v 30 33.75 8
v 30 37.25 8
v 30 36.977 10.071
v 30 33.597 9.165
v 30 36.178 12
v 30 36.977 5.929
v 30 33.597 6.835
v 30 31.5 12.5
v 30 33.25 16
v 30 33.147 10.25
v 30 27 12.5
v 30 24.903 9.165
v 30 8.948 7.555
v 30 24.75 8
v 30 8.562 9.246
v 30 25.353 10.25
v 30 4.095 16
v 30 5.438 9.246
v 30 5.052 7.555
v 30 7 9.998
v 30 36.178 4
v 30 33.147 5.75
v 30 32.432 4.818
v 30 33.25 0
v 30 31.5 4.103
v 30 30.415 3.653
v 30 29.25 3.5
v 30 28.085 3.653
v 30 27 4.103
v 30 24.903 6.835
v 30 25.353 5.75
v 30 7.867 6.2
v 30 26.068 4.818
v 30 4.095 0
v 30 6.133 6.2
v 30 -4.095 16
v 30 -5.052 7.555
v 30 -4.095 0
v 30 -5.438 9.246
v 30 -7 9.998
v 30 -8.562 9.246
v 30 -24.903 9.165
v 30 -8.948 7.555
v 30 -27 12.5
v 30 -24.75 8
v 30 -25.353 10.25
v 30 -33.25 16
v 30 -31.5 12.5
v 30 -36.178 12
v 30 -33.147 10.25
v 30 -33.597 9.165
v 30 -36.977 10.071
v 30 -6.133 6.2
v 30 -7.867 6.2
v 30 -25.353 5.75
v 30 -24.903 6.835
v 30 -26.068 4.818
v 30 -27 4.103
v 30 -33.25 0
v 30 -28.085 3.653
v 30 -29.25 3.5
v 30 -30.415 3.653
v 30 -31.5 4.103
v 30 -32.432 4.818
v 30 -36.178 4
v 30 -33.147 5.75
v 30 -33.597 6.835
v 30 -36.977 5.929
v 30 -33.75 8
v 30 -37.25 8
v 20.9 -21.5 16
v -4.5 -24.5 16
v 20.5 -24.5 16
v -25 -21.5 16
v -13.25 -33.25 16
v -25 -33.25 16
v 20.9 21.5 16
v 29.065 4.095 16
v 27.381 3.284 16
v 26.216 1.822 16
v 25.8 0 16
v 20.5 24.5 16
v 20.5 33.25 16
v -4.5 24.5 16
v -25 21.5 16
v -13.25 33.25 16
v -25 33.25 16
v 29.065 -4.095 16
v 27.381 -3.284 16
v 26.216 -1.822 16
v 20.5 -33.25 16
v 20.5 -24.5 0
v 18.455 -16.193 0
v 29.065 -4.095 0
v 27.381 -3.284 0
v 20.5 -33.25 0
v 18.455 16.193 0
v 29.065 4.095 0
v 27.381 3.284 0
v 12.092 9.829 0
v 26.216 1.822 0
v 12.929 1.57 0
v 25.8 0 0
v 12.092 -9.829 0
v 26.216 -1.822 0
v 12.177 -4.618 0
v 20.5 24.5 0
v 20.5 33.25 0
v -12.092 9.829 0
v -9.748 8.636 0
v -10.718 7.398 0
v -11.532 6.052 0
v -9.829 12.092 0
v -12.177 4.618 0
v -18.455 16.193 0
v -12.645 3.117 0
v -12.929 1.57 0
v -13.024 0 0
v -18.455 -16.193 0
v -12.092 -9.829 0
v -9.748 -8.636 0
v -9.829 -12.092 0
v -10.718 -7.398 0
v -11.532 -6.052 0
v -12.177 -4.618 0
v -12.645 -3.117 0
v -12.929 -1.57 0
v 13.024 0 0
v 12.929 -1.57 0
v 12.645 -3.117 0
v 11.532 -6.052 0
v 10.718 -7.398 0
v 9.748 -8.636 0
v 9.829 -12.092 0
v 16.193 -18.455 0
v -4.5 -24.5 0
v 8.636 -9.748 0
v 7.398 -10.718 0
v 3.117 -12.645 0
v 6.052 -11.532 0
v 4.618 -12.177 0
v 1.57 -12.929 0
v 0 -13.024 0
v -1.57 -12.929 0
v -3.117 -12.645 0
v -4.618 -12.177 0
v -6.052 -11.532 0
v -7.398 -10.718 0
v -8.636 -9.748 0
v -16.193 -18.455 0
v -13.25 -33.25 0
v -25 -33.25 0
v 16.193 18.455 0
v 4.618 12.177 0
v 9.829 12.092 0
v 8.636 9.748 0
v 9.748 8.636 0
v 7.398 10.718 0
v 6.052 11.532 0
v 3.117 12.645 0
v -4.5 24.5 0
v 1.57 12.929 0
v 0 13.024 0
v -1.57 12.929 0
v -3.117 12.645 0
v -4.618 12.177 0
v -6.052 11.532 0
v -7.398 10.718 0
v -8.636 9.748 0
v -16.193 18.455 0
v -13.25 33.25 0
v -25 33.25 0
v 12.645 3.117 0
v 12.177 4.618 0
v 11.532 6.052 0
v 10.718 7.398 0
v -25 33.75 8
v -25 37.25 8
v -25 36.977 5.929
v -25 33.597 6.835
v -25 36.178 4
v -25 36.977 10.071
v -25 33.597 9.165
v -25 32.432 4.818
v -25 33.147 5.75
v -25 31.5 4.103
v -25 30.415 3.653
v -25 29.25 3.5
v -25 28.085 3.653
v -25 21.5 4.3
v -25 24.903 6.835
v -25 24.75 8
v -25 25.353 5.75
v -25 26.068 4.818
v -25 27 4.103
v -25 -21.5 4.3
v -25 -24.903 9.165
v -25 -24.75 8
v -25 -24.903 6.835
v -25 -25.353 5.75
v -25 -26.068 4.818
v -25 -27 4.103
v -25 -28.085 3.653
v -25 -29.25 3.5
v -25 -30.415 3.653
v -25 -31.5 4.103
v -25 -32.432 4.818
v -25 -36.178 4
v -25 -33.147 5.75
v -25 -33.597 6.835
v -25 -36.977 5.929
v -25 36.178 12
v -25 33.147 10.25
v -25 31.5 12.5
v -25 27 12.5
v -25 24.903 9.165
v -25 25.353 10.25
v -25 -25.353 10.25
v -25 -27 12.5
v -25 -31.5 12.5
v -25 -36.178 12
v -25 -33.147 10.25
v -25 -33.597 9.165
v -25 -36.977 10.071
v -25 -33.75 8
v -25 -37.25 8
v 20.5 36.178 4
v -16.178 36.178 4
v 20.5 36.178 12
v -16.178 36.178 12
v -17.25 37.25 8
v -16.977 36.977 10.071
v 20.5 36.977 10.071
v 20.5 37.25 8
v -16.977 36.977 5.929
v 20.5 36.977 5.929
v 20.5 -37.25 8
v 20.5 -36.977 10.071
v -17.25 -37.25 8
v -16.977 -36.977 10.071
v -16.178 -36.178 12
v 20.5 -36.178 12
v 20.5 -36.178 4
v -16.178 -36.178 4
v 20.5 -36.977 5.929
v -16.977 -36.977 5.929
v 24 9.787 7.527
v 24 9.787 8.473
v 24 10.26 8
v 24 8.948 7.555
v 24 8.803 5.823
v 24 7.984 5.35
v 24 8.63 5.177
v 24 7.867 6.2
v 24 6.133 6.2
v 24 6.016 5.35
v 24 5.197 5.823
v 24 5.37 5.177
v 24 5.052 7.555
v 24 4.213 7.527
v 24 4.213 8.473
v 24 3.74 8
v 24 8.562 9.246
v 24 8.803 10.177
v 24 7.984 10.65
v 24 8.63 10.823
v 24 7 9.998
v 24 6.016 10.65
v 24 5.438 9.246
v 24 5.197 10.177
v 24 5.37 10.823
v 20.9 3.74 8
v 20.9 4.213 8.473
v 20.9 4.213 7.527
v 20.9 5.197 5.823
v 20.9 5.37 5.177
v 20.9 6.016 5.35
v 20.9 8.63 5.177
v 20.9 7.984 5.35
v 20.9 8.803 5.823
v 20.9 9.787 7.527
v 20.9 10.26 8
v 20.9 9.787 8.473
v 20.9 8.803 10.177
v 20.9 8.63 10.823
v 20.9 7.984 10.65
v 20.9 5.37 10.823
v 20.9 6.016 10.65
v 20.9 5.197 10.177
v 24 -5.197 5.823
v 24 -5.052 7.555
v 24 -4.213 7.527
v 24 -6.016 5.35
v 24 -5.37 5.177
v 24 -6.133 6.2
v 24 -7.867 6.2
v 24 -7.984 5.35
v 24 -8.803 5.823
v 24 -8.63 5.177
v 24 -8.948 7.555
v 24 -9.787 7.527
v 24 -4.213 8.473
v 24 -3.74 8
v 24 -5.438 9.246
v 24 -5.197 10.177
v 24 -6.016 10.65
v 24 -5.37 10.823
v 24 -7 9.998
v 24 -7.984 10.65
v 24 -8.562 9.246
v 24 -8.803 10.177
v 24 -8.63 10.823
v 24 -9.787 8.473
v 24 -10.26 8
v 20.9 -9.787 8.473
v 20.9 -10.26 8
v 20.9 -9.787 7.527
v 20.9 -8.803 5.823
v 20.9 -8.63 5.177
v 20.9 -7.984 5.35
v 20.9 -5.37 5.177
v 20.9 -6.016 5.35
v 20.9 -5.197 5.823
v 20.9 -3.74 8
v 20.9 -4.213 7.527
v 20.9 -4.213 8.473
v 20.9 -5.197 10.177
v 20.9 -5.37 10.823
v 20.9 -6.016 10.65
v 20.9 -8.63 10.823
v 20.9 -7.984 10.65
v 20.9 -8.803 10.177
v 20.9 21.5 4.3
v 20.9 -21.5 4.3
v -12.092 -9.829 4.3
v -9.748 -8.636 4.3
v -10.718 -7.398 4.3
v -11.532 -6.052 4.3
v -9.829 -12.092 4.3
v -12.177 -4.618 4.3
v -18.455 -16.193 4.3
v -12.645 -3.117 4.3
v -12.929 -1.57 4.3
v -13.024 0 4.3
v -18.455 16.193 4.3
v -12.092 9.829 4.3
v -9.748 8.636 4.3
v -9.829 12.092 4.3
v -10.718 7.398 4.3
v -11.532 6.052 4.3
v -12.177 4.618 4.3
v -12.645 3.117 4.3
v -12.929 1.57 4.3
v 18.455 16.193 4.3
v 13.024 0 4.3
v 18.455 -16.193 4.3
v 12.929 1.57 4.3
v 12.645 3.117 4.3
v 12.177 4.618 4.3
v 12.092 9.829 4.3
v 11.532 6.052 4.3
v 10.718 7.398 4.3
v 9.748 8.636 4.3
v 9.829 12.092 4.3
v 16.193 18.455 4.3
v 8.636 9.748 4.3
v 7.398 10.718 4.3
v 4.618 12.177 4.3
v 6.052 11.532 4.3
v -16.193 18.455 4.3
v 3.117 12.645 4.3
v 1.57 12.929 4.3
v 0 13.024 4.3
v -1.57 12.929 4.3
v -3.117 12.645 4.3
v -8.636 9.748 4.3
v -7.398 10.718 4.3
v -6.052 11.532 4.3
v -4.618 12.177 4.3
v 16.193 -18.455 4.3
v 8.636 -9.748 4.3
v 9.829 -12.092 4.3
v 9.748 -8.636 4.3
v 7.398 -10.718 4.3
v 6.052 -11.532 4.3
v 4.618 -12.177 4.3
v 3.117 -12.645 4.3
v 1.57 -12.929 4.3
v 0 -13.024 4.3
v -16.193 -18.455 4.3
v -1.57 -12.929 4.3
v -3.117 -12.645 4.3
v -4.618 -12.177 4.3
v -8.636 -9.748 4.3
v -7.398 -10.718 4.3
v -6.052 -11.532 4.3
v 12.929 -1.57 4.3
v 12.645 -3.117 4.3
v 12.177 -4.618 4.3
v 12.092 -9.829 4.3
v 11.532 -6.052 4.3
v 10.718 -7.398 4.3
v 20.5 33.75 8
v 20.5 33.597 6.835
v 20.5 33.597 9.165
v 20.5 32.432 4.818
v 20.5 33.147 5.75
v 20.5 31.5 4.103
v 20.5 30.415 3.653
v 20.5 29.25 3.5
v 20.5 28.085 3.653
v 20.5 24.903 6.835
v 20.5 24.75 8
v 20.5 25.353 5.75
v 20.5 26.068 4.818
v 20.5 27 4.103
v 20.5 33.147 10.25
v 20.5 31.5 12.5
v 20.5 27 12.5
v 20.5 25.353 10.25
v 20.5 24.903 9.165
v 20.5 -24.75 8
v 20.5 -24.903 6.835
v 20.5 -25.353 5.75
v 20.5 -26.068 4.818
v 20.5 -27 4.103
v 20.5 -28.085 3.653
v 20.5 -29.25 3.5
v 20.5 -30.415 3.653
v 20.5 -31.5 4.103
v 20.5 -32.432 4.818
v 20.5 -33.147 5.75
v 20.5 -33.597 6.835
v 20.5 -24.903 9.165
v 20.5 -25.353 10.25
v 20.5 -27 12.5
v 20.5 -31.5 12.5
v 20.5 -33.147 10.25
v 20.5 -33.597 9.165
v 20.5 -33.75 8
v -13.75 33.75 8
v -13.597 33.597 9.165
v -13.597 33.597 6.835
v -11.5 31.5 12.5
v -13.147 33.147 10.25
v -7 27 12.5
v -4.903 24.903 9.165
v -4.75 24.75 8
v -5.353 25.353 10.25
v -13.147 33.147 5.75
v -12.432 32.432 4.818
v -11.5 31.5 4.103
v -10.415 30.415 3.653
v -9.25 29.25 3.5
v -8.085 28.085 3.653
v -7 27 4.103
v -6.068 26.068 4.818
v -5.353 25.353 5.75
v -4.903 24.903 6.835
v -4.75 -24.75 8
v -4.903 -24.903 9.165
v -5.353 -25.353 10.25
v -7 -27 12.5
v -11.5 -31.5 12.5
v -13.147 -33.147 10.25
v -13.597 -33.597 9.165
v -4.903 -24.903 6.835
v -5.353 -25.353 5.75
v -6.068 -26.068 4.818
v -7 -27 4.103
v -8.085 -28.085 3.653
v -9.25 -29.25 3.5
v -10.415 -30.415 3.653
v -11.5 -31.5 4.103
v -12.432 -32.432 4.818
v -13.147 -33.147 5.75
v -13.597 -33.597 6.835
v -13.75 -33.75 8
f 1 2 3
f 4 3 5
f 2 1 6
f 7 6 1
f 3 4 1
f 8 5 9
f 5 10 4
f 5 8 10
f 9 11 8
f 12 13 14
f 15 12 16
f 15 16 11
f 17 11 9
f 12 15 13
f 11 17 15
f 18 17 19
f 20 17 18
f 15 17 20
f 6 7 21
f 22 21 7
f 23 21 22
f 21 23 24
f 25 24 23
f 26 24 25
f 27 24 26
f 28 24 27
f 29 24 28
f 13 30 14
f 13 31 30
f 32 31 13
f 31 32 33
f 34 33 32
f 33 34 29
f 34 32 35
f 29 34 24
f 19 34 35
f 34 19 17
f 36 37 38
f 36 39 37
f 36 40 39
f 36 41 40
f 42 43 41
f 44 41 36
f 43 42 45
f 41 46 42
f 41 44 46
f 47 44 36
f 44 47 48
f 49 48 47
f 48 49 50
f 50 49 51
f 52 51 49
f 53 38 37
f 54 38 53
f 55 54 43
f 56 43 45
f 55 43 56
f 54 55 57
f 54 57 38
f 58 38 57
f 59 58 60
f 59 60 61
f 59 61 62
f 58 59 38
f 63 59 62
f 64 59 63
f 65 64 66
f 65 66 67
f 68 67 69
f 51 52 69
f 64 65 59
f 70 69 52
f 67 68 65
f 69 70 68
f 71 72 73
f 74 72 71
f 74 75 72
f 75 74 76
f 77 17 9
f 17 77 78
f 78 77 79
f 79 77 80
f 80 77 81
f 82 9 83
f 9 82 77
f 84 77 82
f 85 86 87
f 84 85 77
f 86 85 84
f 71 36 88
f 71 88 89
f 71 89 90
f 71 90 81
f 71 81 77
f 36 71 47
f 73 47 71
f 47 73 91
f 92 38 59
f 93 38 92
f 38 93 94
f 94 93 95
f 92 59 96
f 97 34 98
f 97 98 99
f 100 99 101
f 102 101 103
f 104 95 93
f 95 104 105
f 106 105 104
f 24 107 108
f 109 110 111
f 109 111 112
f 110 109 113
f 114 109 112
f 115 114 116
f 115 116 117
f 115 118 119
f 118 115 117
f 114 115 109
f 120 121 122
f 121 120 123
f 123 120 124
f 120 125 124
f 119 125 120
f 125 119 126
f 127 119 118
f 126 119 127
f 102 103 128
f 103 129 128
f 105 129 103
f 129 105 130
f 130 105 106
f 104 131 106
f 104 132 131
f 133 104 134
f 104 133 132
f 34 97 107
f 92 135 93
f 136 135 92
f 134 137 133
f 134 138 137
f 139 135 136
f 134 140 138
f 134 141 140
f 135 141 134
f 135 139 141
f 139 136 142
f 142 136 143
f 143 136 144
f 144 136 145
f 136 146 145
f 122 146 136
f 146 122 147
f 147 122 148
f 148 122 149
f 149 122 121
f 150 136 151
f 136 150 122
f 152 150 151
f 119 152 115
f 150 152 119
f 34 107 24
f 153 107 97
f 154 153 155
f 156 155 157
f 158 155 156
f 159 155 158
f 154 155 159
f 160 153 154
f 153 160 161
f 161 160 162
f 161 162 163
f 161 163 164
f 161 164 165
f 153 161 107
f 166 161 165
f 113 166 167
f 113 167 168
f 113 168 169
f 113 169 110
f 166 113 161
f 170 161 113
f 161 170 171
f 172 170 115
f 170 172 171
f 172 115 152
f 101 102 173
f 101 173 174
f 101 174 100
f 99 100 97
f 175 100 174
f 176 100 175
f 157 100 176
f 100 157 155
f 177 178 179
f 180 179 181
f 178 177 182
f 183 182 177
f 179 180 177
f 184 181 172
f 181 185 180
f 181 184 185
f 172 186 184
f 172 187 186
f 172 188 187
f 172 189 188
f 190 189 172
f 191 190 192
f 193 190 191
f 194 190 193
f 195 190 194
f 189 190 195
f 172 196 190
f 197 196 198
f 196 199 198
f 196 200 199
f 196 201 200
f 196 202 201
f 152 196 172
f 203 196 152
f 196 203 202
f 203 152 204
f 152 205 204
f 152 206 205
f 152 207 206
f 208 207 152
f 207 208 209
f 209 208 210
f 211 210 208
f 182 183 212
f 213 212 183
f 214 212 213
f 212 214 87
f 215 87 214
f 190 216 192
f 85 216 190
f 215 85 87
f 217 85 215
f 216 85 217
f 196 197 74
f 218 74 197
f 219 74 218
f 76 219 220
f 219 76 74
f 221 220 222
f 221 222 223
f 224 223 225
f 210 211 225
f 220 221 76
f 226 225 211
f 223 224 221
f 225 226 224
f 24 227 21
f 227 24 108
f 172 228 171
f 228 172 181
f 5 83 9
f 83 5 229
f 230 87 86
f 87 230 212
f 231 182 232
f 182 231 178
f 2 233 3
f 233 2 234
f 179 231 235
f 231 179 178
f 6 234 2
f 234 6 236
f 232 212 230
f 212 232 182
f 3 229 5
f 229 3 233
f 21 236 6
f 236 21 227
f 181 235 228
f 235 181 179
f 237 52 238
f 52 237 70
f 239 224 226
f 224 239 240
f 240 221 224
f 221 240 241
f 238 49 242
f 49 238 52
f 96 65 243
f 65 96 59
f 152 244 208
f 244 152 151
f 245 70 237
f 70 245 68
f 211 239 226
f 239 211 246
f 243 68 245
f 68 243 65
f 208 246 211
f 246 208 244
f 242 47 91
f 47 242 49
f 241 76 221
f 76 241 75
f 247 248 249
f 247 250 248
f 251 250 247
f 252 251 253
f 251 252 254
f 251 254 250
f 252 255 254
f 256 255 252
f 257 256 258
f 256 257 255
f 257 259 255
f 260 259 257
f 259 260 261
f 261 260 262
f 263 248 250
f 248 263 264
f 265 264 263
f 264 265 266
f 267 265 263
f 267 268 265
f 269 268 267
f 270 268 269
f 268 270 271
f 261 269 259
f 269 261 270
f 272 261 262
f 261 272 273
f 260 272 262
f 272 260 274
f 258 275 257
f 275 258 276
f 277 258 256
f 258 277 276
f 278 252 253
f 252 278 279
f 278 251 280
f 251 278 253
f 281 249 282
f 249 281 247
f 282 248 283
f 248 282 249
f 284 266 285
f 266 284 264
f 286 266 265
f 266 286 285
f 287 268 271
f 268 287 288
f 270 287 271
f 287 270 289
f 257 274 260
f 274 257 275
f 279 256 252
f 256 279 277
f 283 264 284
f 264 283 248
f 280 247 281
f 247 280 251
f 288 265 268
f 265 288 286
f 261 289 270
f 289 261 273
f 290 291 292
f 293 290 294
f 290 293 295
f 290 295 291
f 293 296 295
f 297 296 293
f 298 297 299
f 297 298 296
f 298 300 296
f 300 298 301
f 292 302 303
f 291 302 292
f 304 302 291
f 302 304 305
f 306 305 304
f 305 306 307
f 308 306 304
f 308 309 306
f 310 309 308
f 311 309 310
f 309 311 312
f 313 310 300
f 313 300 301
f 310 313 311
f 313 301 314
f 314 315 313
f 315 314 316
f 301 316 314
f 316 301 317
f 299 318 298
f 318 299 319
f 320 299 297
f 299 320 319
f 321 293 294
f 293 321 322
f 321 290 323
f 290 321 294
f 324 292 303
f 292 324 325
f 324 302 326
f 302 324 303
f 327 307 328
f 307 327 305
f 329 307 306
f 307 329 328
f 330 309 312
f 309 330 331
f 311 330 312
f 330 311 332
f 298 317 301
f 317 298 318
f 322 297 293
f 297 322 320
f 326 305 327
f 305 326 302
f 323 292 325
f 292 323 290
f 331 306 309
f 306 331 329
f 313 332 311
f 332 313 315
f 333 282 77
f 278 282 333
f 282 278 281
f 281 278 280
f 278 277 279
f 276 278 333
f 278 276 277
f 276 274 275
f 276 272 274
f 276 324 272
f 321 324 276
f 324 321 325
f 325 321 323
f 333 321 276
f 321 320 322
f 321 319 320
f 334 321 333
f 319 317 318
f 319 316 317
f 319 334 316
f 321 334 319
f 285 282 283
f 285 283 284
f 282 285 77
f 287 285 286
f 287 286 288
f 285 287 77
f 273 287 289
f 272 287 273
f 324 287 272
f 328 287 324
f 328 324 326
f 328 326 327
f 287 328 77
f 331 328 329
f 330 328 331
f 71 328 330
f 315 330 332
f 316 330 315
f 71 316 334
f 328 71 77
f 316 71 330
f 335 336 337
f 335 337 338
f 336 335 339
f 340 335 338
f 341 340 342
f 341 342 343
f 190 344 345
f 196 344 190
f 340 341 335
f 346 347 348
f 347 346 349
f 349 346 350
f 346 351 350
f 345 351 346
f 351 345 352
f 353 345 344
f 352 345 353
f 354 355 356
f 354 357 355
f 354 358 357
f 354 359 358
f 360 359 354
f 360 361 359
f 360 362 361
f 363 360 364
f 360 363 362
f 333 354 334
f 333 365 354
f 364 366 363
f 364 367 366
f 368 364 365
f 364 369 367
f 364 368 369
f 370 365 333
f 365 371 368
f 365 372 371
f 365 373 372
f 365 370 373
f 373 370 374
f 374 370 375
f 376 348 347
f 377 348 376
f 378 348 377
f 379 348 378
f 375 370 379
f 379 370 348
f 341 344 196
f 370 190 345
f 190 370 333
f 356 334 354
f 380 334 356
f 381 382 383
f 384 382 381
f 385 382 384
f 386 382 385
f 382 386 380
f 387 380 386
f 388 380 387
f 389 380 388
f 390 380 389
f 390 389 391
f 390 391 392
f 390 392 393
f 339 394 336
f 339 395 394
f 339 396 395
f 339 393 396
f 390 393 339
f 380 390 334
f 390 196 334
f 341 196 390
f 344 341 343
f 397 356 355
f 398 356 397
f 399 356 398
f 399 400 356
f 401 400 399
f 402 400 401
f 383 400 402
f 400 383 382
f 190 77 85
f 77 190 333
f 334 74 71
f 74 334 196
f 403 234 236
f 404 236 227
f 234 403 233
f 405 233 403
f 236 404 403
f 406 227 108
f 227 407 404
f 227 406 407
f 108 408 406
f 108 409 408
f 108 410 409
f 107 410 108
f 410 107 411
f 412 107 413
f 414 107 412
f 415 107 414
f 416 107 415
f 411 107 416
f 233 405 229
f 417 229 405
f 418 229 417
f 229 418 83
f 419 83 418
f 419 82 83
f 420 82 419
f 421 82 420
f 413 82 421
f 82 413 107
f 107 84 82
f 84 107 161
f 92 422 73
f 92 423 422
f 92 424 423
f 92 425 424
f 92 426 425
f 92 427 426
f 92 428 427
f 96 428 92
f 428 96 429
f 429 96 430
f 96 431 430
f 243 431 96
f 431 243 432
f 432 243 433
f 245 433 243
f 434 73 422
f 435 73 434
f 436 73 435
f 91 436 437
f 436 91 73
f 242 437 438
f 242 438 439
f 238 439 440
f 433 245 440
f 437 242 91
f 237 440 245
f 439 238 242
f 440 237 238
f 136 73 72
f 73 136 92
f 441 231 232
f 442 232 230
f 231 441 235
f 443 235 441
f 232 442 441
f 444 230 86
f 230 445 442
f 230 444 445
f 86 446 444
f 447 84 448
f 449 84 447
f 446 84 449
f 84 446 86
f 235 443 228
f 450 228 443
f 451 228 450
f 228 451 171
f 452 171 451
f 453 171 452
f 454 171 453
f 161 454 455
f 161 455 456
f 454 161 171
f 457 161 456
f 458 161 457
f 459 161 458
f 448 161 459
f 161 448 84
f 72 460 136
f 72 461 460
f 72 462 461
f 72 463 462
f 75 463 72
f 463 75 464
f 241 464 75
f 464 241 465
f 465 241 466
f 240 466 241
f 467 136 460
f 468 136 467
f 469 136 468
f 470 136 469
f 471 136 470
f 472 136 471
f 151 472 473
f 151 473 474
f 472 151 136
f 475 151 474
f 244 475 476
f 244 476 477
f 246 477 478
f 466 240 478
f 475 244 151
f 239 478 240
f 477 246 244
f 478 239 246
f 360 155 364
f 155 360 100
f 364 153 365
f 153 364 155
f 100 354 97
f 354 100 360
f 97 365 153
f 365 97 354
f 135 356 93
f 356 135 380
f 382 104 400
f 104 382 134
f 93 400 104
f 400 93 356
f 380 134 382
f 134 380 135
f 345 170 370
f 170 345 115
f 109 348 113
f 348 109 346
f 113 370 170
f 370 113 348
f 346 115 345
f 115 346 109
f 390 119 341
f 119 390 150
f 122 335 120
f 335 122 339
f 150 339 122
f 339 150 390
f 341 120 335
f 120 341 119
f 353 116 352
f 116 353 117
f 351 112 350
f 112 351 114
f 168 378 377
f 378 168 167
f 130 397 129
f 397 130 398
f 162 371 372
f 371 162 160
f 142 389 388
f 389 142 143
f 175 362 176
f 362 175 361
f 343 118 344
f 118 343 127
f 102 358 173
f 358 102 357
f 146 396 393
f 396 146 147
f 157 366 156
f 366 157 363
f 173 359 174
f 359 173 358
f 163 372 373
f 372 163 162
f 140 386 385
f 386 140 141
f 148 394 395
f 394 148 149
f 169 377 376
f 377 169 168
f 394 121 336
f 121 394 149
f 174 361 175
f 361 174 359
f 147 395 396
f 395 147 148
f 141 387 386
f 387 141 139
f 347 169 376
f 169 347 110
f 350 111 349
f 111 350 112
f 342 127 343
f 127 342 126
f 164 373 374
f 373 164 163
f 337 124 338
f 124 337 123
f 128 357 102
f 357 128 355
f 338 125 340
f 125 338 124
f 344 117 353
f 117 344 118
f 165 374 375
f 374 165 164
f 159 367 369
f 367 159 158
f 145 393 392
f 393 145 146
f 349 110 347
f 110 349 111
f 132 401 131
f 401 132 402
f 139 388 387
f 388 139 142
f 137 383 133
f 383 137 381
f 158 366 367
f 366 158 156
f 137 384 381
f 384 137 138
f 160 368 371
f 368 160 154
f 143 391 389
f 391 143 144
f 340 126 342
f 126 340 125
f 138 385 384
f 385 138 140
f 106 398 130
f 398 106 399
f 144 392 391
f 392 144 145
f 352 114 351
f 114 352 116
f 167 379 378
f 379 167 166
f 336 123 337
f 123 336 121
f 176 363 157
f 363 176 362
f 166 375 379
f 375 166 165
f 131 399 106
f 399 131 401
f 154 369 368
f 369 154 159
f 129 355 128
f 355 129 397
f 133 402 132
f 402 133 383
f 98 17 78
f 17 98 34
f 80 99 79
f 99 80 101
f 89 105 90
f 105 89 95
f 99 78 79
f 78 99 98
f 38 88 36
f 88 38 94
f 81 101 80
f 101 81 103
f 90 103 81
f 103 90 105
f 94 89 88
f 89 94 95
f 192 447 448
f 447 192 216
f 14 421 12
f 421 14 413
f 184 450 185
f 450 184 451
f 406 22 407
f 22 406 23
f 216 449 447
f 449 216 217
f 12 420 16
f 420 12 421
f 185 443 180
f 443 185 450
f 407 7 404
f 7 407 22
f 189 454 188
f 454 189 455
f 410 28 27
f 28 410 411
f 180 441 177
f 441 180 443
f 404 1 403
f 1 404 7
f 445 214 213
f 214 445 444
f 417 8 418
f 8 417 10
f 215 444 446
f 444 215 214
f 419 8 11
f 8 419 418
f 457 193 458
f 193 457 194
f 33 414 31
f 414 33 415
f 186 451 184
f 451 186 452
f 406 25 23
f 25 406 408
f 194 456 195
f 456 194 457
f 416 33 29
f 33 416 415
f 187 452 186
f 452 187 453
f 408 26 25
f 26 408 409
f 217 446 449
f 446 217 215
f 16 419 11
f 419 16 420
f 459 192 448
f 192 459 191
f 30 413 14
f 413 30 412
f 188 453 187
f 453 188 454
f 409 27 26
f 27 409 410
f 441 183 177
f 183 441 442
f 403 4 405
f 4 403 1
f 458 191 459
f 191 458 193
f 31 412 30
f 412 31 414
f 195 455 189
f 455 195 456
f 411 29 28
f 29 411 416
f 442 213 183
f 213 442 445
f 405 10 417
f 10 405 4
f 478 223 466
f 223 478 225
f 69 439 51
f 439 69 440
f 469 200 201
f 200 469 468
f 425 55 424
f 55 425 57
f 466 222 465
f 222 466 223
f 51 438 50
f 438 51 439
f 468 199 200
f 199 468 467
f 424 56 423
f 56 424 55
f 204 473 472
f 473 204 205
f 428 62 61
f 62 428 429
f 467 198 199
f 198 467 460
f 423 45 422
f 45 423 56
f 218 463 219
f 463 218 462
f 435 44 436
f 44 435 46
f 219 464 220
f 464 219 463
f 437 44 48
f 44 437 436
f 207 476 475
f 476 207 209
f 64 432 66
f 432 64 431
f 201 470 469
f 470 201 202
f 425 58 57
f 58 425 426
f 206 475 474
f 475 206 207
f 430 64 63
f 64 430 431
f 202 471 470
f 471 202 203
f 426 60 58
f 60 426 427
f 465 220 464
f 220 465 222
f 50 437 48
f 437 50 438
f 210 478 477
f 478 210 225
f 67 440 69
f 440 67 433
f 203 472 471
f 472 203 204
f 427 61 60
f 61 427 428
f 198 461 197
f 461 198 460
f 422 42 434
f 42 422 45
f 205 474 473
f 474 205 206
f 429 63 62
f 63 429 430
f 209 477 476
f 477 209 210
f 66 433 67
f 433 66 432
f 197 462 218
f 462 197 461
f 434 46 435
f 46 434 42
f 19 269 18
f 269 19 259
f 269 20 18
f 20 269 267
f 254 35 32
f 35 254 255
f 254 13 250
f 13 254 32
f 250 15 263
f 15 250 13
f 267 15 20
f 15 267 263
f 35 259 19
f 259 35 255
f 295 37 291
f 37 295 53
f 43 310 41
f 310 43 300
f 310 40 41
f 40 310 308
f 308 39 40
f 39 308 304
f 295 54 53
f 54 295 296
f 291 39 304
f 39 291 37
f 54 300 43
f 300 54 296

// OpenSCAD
// file: functions.scad
// PRUSA Mendel  
// Functions used in many files
// GNU GPL v3
// Josef Průša
// josefprusa@me.com
// prusadjs.cz
// http://www.reprap.org/wiki/Prusa_Mendel
// http://github.com/prusajr/PrusaMendel


module nut(d,h,horizontal=true){
cornerdiameter =  (d / 2) / cos (180 / 6);
cylinder(h = h, r = cornerdiameter, $fn = 6);
if(horizontal){
for(i = [1:6]){
	rotate([0,0,60*i]) translate([-cornerdiameter-0.2,0,0]) rotate([0,0,-45]) cube(size = [2,2,h]);
}}
}

// Based on nophead research
module polyhole(d,h) {
    n = max(round(2 * d),3);
    rotate([0,0,180])
        cylinder(h = h, r = (d / 2) / cos (180 / n), $fn = n);
}




module roundcorner(diameter){
	difference(){
		cube(size = [diameter,diameter,99], center = false);
		translate(v = [diameter, diameter, 0]) cylinder(h = 100, r=diameter, center=true);
	}
}
// file: metric.scad
// PRUSA Mendel  
// Default metric sizes
// GNU GPL v3
// Josef Průša
// josefprusa@me.com
// prusadjs.cz
// http://www.reprap.org/wiki/Prusa_Mendel
// http://github.com/prusajr/PrusaMendel

// DONT CHANGE THIS FILE! ALTER VALUES IN CONFIGURATION.SCAD INSTEAD

// RODS

threaded_rod_diameter = 8.7;
threaded_rod_diameter_horizontal = 8.7;
smooth_bar_diameter = 8;
smooth_bar_diameter_horizontal = 8.5;

// Nuts and bolts

m8_diameter = 9;
m8_nut_diameter = 14.1;

m4_diameter = 4.5;
m4_nut_diameter = 9;

m3_diameter = 3.6;
m3_nut_diameter = 5.3;
m3_nut_diameter_horizontal = 6.1;

// Bushing holder

bushing_core_diameter = smooth_bar_diameter;
bushing_material_thickness = 1;

// Motors

motor_shaft = 5.5;
// file: teardrop.scad
teardrop();

module teardrop (r=4.5,h=20,top_and_bottom=false)
{
	rotate([-270,0,90])
	linear_extrude(height=h,convexity=10)
	{
		circle(r=r, $fn = 24);
		polygon(points=[[0,0],[r*cos(30),r*sin(30)],[0.5*r,r],[-0.5*r,r],[-r*cos(30),r*sin(30)]],
				paths=[[0,1,2,3,4]]);
		if (top_and_bottom)
		polygon(points=[[0,0],[r*cos(30),-r*sin(30)],[0.5*r,-r],[-0.5*r,-r],[-r*cos(30),-r*sin(30)]],
				paths=[[0,1,2,3,4]]);
		
	}
}

module teardropcentering (r=4.5,h=20)
{
	rotate([-270,0,90])
	linear_extrude(height=h)
	{
		circle(r=r, $fn = 24);
		polygon(points=[[0,0],[r*cos(30),r*sin(30)],[0.5*r,1.2*r],[-0.5*r,1.2*r],[-r*cos(30),r*sin(30)]],
				paths=[[0,1,2,3,4]]);
	}
}

module teardropcentering2 (r=4.5,h=20)
{
	//rotate([-270,0,90])
	difference(){
	linear_extrude(height=h)
	{
		circle(r=r, $fn = 24);
		polygon(points=[[0,0],[r*cos(30),r*sin(30)],[0.5*r,1.2*r],[-0.5*r,1.2*r],[-r*cos(30),r*sin(30)]],
				paths=[[0,1,2,3,4]]);
	}
	translate(v = [-1.5*r, -1.5*r,-1])cube(size =[3*r,1.5*r,h+2]);
	}
}
// file: configuration.scad
// PRUSA Mendel  
// Configuration file
// GNU GPL v3
// Josef Průša
// josefprusa@me.com
// prusadjs.cz
// http://www.reprap.org/wiki/Prusa_Mendel
// http://github.com/prusajr/PrusaMendel

// PLEASE SELECT ONE OF THE CONFIGURATIONS BELOW
// BY UN-COMMENTING IT

// Uncomment for metric settings
// METRIC METRIC METRIC METRIC METRIC METRIC METRIC METRIC 

include <metric.scad>;

// CUSTOM CUSTOM CUSTOM CUSTOM CUSTOM CUSTOM CUSTOM CUSTOM CUSTOM

thin_wall = 3;


// Linear bearing version
linear = false;
// set false for LM-8UU, true for LM-E-8UU (ignore if linear is set to false)
lme8uu = false;



// CHANGE ONLY THE STUFF YOU KNOW
// IT WILL REPLACE DEFAULT SETTING

// RODS

// threaded_rod_diameter = 0;
// threaded_rod_diameter_horizontal = 0;
// smooth_bar_diameter = 0;
// smooth_bar_diameter_horizontal = 0;

// Nuts and bolts

// m8_diameter = 0;
// m8_nut_diameter = 0;

// m4_diameter = 0;
// m4_nut_diameter = 0;

// m3_diameter = 0;
// m3_nut_diameter = 0;

// Bushing holder

// bushing_core_diameter = smooth_bar_diameter;
// bushing_material_thickness = 0;


///counted stuff
m3_nut_diameter_bigger = ((m3_nut_diameter  / 2) / cos (180 / 6))*2;

// functions 
include <functions.scad>
// main file
// PRUSA Mendel  
// Z motor mount
// Used for mounting Z motors
// GNU GPL v2
// Josef Průša
// josefprusa@me.com
// prusadjs.cz
// http://www.reprap.org/wiki/Prusa_Mendel
// http://github.com/prusajr/PrusaMendel
include <configuration.scad>

use<teardrop.scad>

/**
 * @id z-motor-mount
 * @name Z motor mount
 * @category Printed
 * @using 2 m3x25xhex
 * @using 2 m3nut
 * @using 2 m3washer
 * @using 4 m8nut
 * @using 4 m8washer
 * @using 1 rod-clamp
 */
 
module zmotormount()
{
	translate([0,0,8])
	difference()
	{
		union()
		{
			translate(v=[2.5,0,0]) cube(size = [55,60,16], center = true);
			translate(v=[2.5,0,-4]) cube(size = [55,74.5-16,8], center = true);
			translate(v=[-25,29.25,0])teardrop(h = 55, r=8, $fn=30,top_and_bottom=true);
			translate(v=[-25,-29.25,0])teardrop(h = 55, r=8, $fn=30,top_and_bottom=true);
		}
		translate(v=[-2.1,0,2.8]) cube(size = [46,43,13], center = true);
		
		// reducing the material
		translate(v=[10.5-2.5,34.5,-4]) cube(size = [25,20,30], center = true);
		translate(v=[10.5-2.5,-34.5,-4]) cube(size = [25,20,30], center = true);
		translate(v=[-10,0,0]) translate(v=[5.5,24.5,-10]) rotate(a=[0,0,45]) cube(size = [20,20,30]);
		translate(v=[-10,0,0]) translate(v=[5.5,-24.5,-10]) rotate(a=[0,0,225]) cube(size = [20,20,30]);
		
		// Nema 17
		rotate ([0,0,45]) translate([20,0,0]) cube(size = [9,3.2,25], center = true);
		rotate ([0,0,-45]) translate([20,0,0]) cube(size = [9,3.2,25], center = true);
		rotate ([0,0,135]) translate([20,0,0]) cube(size = [9,3.2,25], center = true);
		rotate ([0,0,-135]) translate([20,0,0]) cube(size = [9,3.2,25], center = true);
		translate(v=[0,0,-10])polyhole(26,20);
		
		translate(v=[30,0,-10]) cylinder(h = 20, r=4.2);

		translate(v=[-26,29.25,0])
		teardrop(h = 58, r=m8_diameter/2);

		translate(v=[-26,-29.25,0])
		teardrop(h = 58, r=m8_diameter/2);
		
		
		translate(v=[16,7,0]) rotate(a=[0,90,0]) polyhole(m3_diameter,15);
		translate(v=[16,-7,0]) rotate(a=[0,90,0]) polyhole(m3_diameter,15);
		translate(v=[0,7,0]) rotate(a=[0,90,0]) rotate(a=[0,0,30]) nut(m3_nut_diameter, 24, true);
		translate(v=[0,-7,0]) rotate(a=[0,90,0]) rotate(a=[0,0,30]) nut(m3_nut_diameter, 24, true);
		
	}
}

zmotormount();
